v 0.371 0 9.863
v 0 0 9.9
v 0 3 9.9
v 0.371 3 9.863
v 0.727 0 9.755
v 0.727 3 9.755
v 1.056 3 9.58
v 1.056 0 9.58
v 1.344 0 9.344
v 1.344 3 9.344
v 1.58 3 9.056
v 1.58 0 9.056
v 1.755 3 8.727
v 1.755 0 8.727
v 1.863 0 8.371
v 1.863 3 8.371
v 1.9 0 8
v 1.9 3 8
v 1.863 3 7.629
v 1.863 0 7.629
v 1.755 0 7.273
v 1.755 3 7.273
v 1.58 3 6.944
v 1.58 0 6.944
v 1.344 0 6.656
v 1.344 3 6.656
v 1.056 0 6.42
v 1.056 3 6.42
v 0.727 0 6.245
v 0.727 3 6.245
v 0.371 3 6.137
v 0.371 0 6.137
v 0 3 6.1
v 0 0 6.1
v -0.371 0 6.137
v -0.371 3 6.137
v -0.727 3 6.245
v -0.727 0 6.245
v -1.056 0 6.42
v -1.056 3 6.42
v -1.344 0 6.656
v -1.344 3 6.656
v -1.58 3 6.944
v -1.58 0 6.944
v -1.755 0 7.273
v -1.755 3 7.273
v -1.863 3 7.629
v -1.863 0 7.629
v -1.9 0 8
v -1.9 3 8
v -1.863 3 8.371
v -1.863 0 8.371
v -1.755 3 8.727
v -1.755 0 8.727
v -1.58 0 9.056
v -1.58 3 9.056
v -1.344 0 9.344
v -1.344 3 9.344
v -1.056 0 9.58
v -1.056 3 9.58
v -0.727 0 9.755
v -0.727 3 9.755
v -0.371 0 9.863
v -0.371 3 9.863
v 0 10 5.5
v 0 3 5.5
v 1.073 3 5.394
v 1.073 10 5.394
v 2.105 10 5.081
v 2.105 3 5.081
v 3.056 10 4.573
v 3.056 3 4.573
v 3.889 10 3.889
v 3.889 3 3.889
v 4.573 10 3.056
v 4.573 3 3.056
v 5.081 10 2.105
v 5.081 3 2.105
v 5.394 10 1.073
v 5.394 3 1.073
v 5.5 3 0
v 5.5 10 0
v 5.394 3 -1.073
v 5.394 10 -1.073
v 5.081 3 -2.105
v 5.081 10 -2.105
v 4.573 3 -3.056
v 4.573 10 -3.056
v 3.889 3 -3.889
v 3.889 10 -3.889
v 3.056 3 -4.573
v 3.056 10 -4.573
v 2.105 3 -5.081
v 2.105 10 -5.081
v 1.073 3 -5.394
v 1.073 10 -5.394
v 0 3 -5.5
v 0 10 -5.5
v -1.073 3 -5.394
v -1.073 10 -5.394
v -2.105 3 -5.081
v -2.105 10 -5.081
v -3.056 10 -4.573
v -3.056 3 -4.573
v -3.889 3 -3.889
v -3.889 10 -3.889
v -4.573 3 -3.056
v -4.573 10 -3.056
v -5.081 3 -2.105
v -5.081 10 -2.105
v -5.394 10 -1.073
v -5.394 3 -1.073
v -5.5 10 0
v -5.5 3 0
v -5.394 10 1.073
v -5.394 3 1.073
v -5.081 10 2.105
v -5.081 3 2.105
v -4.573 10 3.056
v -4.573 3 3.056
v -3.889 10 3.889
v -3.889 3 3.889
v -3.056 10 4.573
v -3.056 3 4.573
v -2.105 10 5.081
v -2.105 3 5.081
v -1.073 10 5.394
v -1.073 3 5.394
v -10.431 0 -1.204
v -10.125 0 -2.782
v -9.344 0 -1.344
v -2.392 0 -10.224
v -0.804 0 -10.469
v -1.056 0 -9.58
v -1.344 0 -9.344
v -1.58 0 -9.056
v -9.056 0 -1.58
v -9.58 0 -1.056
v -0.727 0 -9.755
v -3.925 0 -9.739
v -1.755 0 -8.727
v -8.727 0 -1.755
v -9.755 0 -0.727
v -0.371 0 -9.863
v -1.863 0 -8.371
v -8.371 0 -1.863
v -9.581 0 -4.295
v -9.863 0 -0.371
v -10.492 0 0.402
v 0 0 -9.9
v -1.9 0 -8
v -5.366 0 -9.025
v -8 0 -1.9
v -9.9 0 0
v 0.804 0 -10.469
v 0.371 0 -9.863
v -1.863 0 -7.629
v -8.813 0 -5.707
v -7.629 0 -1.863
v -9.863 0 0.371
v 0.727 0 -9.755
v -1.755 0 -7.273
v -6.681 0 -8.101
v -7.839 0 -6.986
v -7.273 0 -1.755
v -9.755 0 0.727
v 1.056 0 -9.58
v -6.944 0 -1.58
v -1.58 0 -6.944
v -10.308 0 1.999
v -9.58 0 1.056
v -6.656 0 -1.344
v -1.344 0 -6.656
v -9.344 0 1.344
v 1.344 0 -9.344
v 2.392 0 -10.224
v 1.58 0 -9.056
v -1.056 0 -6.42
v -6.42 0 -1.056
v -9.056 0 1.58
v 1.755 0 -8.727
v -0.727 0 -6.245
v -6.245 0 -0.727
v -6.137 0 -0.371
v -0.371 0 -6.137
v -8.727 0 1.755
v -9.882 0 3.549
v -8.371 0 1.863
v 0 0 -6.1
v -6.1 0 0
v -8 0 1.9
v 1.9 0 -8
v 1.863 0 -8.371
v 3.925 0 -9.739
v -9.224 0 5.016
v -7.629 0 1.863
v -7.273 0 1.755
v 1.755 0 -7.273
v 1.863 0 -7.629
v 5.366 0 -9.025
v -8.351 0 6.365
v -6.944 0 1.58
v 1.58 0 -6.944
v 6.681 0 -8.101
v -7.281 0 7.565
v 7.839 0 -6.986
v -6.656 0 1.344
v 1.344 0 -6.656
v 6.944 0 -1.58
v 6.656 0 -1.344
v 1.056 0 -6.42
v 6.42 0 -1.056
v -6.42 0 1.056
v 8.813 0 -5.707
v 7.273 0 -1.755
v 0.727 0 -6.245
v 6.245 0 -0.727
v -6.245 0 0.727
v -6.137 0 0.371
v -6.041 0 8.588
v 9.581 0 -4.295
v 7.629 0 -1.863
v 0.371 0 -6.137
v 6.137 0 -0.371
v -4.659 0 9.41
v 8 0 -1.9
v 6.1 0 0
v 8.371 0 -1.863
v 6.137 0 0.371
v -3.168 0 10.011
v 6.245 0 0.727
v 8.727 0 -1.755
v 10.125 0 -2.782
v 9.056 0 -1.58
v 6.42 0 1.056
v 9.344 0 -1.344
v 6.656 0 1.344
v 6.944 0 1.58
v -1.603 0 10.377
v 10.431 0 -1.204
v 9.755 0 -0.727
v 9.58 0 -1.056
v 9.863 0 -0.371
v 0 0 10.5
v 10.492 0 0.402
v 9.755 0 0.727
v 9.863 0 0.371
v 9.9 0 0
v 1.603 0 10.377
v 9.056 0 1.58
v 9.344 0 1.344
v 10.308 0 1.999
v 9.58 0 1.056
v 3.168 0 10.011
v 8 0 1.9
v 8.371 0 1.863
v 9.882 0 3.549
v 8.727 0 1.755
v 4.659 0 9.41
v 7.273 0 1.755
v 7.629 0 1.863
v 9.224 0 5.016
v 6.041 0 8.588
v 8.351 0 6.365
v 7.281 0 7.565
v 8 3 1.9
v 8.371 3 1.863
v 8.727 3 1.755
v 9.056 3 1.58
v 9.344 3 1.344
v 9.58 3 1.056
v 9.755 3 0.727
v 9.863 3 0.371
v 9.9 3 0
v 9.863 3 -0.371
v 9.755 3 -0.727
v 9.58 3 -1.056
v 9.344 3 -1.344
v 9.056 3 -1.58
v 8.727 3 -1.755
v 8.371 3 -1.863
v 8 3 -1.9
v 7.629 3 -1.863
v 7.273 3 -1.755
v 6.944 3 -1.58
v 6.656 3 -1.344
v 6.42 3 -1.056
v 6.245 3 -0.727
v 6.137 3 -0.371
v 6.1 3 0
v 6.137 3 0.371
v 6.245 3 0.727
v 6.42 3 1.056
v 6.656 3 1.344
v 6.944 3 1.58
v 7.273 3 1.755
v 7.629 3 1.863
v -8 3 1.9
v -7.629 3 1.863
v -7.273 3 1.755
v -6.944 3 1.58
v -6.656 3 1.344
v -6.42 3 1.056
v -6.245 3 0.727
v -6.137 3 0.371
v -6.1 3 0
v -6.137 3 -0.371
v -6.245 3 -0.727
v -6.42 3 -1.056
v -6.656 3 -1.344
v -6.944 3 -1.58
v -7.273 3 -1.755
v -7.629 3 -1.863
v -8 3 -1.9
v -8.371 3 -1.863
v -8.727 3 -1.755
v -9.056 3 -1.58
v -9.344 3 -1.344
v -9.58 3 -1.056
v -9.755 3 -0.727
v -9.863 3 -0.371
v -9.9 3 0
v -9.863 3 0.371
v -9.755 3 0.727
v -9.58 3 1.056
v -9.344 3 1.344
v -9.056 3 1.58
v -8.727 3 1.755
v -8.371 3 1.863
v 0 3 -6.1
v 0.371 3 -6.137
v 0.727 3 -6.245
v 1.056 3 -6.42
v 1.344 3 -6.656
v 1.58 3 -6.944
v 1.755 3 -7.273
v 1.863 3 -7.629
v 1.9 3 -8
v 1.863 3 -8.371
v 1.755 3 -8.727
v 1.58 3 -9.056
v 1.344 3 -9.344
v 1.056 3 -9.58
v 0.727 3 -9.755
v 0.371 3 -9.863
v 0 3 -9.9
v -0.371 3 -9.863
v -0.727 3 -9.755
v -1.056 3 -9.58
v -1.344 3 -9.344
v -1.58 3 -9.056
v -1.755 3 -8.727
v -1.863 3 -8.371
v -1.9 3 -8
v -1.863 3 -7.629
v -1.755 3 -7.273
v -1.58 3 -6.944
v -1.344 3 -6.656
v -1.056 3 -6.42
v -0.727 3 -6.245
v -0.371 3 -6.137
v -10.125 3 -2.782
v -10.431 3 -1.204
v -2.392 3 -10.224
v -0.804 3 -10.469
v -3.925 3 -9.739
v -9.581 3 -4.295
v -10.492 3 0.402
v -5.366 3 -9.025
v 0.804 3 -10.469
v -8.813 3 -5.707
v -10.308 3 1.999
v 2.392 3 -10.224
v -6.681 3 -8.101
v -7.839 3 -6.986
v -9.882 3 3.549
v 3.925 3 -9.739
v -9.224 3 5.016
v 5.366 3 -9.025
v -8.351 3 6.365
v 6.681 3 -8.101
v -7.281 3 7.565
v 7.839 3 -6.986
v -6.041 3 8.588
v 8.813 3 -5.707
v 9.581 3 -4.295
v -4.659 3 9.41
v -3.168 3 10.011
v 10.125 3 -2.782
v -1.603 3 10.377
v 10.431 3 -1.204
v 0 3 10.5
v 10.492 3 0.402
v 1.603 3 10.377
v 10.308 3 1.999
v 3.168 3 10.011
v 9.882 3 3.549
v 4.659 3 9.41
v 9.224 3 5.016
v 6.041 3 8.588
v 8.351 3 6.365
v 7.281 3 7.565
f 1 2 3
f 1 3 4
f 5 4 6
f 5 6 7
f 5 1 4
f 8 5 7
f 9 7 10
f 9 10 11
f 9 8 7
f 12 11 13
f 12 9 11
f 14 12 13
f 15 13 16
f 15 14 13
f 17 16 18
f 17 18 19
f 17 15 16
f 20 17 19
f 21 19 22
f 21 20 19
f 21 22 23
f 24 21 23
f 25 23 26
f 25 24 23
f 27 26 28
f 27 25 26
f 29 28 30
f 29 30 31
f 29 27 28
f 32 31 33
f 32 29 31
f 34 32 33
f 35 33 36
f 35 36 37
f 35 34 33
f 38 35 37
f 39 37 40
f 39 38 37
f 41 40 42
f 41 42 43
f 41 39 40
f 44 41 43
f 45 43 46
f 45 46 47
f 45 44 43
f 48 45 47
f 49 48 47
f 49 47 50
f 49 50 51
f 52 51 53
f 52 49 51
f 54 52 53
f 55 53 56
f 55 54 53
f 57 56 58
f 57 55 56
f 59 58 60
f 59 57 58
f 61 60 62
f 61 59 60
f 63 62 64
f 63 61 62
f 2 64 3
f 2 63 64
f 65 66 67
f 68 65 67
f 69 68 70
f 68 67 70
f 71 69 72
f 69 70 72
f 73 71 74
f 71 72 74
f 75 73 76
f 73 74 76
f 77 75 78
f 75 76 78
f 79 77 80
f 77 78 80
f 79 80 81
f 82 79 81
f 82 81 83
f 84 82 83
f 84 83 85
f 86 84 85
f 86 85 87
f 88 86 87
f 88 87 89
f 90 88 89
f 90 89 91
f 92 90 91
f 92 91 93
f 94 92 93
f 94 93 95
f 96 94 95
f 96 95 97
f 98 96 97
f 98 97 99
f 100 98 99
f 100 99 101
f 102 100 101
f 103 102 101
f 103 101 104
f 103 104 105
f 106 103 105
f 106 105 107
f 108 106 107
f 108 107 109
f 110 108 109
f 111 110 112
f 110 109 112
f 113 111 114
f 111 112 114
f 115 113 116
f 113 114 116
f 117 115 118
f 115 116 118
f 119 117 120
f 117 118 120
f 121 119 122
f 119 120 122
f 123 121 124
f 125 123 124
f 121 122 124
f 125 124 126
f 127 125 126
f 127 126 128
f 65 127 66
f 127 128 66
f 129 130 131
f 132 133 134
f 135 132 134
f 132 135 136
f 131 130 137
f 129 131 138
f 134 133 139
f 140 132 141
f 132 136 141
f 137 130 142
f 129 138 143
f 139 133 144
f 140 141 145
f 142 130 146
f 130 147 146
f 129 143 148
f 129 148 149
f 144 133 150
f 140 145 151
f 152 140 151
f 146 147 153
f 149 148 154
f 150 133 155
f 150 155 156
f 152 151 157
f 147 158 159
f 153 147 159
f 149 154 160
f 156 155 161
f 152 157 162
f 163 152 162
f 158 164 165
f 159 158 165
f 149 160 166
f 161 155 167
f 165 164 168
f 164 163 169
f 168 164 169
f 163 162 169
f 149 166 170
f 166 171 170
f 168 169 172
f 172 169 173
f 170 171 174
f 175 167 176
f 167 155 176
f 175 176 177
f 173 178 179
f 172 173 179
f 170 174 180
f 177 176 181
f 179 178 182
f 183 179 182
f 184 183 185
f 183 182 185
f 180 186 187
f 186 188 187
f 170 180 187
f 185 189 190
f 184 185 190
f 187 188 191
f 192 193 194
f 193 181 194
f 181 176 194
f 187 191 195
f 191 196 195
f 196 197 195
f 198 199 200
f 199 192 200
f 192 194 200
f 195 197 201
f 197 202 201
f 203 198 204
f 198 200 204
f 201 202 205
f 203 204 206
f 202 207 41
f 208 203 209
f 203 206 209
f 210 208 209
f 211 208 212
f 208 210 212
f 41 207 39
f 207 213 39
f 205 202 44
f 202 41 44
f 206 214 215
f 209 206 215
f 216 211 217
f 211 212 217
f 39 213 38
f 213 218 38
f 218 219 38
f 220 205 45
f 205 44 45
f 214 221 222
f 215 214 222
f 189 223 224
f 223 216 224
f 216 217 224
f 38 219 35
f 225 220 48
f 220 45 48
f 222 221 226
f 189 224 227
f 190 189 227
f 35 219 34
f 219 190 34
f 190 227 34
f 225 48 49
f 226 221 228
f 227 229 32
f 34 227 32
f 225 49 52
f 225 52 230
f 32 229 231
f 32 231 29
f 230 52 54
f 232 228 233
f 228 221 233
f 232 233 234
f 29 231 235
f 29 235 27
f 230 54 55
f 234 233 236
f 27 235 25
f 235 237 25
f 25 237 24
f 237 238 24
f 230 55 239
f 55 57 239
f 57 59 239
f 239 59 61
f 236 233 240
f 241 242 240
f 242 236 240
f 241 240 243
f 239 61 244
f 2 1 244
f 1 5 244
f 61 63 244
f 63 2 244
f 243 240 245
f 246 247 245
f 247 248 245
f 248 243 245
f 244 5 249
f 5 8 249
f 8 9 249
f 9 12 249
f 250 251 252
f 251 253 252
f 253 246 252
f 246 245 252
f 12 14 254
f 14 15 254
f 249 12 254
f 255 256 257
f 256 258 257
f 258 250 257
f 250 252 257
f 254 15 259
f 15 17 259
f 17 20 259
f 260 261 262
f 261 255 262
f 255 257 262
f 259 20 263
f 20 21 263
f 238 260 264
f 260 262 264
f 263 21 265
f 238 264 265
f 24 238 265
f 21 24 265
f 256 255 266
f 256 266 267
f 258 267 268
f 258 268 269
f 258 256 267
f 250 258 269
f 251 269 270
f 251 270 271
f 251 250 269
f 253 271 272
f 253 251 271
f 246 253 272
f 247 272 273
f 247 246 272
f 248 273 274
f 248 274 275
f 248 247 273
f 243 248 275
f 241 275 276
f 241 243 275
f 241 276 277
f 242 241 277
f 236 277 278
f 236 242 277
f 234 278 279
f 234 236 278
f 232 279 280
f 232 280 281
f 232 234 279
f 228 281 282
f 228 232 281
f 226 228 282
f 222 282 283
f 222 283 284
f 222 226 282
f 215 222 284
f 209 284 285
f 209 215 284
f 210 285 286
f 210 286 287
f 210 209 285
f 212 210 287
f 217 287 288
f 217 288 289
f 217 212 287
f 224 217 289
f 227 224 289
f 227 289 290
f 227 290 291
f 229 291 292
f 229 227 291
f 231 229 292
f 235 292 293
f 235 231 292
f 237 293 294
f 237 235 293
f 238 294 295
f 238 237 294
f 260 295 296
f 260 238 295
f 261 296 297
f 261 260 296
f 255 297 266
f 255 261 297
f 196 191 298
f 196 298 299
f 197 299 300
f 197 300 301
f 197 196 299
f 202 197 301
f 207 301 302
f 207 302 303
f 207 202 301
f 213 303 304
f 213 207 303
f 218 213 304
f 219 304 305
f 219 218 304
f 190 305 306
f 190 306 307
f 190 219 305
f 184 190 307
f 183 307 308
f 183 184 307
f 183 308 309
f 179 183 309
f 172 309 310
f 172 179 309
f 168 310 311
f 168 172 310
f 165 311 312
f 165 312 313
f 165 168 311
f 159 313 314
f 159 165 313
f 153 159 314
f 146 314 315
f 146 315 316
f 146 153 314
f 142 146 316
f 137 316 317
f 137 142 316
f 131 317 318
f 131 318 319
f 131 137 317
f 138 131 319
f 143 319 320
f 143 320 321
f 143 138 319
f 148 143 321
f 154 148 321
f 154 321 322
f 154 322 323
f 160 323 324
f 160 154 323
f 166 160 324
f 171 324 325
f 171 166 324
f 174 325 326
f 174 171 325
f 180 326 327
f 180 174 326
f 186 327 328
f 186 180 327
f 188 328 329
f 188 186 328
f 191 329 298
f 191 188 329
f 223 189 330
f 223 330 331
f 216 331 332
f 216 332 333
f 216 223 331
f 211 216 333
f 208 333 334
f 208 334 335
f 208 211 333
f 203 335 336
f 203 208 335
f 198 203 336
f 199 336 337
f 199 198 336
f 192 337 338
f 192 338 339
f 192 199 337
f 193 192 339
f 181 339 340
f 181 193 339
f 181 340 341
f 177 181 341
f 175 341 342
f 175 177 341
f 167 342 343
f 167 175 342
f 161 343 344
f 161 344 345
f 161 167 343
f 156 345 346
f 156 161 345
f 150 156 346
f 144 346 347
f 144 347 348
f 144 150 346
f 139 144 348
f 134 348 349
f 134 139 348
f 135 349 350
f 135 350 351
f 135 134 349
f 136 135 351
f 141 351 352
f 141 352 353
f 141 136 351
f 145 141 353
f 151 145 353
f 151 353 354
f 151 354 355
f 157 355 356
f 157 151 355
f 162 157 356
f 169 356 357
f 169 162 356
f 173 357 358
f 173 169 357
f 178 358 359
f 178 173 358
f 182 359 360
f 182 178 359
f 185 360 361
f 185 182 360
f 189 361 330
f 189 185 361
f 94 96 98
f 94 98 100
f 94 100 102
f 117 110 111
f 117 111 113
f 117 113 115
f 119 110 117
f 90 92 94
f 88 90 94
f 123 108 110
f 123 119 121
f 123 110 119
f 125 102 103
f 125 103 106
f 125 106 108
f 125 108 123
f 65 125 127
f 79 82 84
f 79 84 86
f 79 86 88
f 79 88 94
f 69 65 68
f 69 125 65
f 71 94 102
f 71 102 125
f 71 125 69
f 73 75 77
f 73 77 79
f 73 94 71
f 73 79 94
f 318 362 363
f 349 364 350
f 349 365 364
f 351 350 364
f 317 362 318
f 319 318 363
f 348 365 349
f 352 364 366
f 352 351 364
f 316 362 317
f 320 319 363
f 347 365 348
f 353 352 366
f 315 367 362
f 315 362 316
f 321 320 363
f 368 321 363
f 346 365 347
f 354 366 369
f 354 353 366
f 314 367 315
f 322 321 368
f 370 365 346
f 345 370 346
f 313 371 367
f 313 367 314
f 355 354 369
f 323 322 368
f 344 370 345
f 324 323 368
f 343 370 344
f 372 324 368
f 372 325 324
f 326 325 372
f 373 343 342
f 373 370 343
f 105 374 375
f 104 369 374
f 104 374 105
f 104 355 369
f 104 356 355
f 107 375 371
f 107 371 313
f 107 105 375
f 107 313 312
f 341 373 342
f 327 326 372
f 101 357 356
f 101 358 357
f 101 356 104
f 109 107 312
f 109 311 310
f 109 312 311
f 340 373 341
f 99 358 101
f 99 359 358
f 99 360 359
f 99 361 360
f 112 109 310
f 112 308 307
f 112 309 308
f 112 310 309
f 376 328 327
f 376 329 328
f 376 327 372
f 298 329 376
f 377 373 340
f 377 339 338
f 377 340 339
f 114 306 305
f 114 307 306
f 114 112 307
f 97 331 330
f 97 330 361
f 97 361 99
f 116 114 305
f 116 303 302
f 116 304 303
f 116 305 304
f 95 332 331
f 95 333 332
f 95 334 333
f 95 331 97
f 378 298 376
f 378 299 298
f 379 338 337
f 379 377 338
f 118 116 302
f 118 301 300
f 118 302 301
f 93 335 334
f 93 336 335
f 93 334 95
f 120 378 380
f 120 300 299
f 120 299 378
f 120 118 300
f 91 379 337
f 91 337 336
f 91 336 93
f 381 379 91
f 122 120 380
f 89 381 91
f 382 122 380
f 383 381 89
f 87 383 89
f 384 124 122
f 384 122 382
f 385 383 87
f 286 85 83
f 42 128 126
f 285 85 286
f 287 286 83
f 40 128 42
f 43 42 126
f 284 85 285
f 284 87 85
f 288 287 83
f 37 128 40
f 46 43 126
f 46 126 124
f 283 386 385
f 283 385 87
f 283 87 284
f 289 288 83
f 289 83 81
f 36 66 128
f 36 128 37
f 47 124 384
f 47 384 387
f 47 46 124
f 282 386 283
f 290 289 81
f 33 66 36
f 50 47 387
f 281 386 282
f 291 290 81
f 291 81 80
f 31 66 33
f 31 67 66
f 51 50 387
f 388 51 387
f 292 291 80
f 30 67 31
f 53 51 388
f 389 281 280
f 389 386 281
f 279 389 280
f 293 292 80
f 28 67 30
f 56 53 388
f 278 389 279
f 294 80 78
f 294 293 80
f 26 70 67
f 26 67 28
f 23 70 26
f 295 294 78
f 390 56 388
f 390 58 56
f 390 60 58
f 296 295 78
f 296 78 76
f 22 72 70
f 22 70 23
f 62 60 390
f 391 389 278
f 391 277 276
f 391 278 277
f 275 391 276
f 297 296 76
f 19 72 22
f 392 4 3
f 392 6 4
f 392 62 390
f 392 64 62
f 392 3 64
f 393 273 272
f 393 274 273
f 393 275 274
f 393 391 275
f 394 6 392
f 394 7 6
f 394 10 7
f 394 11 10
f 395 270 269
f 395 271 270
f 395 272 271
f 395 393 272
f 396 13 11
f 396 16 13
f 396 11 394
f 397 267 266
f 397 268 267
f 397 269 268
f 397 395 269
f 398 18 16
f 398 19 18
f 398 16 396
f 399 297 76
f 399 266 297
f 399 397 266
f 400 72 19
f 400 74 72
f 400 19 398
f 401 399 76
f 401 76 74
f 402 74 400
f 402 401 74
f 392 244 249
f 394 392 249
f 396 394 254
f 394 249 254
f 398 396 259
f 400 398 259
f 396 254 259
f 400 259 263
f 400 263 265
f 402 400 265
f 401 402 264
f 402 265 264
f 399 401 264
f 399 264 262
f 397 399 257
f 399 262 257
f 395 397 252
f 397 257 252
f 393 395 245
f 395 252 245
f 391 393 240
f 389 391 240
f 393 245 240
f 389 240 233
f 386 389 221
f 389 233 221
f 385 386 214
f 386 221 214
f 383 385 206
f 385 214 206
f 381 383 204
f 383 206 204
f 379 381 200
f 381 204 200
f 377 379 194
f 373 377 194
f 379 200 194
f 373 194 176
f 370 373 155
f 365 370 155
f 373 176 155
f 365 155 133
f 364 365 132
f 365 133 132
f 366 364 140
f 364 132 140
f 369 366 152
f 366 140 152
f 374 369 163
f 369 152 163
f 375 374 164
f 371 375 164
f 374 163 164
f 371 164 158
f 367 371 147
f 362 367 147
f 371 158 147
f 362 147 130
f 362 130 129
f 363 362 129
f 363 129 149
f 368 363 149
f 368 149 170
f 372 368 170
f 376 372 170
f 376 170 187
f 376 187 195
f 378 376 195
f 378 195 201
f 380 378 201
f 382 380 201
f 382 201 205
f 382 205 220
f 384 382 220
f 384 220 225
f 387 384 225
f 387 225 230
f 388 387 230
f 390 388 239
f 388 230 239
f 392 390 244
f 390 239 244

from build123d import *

# Parameters (mm, degrees)
SKETCH_1_R      = 10.5
SKETCH_1_R_2    = 1.9
EXTRUDE_1_DEPTH = 3
SKETCH_1_3_R    = 5.5
EXTRUDE_2_DEPTH = 10


with BuildPart() as part:
    # 草图1 → 凸台-拉伸1 (new body)
    with BuildSketch(Plane(origin=(0, 0, 0), x_dir=(1, 0, 0), z_dir=(0, 1, 0))):
        Circle(SKETCH_1_R)
        with Locations((0, -8)):
            Circle(SKETCH_1_R_2, mode=Mode.SUBTRACT)
        with Locations((-8, 0)):
            Circle(SKETCH_1_R_2, mode=Mode.SUBTRACT)
        with Locations((8, 0)):
            Circle(SKETCH_1_R_2, mode=Mode.SUBTRACT)
        with Locations((0, 8)):
            Circle(SKETCH_1_R_2, mode=Mode.SUBTRACT)
    extrude(amount=EXTRUDE_1_DEPTH)

    # 草图1<3> → 凸台-拉伸2 (add)
    with BuildSketch(Plane(origin=(0, 0, 0), x_dir=(1, 0, 0), z_dir=(0, 1, 0))):
        Circle(SKETCH_1_3_R)
    extrude(amount=EXTRUDE_2_DEPTH)


solid = part.part
